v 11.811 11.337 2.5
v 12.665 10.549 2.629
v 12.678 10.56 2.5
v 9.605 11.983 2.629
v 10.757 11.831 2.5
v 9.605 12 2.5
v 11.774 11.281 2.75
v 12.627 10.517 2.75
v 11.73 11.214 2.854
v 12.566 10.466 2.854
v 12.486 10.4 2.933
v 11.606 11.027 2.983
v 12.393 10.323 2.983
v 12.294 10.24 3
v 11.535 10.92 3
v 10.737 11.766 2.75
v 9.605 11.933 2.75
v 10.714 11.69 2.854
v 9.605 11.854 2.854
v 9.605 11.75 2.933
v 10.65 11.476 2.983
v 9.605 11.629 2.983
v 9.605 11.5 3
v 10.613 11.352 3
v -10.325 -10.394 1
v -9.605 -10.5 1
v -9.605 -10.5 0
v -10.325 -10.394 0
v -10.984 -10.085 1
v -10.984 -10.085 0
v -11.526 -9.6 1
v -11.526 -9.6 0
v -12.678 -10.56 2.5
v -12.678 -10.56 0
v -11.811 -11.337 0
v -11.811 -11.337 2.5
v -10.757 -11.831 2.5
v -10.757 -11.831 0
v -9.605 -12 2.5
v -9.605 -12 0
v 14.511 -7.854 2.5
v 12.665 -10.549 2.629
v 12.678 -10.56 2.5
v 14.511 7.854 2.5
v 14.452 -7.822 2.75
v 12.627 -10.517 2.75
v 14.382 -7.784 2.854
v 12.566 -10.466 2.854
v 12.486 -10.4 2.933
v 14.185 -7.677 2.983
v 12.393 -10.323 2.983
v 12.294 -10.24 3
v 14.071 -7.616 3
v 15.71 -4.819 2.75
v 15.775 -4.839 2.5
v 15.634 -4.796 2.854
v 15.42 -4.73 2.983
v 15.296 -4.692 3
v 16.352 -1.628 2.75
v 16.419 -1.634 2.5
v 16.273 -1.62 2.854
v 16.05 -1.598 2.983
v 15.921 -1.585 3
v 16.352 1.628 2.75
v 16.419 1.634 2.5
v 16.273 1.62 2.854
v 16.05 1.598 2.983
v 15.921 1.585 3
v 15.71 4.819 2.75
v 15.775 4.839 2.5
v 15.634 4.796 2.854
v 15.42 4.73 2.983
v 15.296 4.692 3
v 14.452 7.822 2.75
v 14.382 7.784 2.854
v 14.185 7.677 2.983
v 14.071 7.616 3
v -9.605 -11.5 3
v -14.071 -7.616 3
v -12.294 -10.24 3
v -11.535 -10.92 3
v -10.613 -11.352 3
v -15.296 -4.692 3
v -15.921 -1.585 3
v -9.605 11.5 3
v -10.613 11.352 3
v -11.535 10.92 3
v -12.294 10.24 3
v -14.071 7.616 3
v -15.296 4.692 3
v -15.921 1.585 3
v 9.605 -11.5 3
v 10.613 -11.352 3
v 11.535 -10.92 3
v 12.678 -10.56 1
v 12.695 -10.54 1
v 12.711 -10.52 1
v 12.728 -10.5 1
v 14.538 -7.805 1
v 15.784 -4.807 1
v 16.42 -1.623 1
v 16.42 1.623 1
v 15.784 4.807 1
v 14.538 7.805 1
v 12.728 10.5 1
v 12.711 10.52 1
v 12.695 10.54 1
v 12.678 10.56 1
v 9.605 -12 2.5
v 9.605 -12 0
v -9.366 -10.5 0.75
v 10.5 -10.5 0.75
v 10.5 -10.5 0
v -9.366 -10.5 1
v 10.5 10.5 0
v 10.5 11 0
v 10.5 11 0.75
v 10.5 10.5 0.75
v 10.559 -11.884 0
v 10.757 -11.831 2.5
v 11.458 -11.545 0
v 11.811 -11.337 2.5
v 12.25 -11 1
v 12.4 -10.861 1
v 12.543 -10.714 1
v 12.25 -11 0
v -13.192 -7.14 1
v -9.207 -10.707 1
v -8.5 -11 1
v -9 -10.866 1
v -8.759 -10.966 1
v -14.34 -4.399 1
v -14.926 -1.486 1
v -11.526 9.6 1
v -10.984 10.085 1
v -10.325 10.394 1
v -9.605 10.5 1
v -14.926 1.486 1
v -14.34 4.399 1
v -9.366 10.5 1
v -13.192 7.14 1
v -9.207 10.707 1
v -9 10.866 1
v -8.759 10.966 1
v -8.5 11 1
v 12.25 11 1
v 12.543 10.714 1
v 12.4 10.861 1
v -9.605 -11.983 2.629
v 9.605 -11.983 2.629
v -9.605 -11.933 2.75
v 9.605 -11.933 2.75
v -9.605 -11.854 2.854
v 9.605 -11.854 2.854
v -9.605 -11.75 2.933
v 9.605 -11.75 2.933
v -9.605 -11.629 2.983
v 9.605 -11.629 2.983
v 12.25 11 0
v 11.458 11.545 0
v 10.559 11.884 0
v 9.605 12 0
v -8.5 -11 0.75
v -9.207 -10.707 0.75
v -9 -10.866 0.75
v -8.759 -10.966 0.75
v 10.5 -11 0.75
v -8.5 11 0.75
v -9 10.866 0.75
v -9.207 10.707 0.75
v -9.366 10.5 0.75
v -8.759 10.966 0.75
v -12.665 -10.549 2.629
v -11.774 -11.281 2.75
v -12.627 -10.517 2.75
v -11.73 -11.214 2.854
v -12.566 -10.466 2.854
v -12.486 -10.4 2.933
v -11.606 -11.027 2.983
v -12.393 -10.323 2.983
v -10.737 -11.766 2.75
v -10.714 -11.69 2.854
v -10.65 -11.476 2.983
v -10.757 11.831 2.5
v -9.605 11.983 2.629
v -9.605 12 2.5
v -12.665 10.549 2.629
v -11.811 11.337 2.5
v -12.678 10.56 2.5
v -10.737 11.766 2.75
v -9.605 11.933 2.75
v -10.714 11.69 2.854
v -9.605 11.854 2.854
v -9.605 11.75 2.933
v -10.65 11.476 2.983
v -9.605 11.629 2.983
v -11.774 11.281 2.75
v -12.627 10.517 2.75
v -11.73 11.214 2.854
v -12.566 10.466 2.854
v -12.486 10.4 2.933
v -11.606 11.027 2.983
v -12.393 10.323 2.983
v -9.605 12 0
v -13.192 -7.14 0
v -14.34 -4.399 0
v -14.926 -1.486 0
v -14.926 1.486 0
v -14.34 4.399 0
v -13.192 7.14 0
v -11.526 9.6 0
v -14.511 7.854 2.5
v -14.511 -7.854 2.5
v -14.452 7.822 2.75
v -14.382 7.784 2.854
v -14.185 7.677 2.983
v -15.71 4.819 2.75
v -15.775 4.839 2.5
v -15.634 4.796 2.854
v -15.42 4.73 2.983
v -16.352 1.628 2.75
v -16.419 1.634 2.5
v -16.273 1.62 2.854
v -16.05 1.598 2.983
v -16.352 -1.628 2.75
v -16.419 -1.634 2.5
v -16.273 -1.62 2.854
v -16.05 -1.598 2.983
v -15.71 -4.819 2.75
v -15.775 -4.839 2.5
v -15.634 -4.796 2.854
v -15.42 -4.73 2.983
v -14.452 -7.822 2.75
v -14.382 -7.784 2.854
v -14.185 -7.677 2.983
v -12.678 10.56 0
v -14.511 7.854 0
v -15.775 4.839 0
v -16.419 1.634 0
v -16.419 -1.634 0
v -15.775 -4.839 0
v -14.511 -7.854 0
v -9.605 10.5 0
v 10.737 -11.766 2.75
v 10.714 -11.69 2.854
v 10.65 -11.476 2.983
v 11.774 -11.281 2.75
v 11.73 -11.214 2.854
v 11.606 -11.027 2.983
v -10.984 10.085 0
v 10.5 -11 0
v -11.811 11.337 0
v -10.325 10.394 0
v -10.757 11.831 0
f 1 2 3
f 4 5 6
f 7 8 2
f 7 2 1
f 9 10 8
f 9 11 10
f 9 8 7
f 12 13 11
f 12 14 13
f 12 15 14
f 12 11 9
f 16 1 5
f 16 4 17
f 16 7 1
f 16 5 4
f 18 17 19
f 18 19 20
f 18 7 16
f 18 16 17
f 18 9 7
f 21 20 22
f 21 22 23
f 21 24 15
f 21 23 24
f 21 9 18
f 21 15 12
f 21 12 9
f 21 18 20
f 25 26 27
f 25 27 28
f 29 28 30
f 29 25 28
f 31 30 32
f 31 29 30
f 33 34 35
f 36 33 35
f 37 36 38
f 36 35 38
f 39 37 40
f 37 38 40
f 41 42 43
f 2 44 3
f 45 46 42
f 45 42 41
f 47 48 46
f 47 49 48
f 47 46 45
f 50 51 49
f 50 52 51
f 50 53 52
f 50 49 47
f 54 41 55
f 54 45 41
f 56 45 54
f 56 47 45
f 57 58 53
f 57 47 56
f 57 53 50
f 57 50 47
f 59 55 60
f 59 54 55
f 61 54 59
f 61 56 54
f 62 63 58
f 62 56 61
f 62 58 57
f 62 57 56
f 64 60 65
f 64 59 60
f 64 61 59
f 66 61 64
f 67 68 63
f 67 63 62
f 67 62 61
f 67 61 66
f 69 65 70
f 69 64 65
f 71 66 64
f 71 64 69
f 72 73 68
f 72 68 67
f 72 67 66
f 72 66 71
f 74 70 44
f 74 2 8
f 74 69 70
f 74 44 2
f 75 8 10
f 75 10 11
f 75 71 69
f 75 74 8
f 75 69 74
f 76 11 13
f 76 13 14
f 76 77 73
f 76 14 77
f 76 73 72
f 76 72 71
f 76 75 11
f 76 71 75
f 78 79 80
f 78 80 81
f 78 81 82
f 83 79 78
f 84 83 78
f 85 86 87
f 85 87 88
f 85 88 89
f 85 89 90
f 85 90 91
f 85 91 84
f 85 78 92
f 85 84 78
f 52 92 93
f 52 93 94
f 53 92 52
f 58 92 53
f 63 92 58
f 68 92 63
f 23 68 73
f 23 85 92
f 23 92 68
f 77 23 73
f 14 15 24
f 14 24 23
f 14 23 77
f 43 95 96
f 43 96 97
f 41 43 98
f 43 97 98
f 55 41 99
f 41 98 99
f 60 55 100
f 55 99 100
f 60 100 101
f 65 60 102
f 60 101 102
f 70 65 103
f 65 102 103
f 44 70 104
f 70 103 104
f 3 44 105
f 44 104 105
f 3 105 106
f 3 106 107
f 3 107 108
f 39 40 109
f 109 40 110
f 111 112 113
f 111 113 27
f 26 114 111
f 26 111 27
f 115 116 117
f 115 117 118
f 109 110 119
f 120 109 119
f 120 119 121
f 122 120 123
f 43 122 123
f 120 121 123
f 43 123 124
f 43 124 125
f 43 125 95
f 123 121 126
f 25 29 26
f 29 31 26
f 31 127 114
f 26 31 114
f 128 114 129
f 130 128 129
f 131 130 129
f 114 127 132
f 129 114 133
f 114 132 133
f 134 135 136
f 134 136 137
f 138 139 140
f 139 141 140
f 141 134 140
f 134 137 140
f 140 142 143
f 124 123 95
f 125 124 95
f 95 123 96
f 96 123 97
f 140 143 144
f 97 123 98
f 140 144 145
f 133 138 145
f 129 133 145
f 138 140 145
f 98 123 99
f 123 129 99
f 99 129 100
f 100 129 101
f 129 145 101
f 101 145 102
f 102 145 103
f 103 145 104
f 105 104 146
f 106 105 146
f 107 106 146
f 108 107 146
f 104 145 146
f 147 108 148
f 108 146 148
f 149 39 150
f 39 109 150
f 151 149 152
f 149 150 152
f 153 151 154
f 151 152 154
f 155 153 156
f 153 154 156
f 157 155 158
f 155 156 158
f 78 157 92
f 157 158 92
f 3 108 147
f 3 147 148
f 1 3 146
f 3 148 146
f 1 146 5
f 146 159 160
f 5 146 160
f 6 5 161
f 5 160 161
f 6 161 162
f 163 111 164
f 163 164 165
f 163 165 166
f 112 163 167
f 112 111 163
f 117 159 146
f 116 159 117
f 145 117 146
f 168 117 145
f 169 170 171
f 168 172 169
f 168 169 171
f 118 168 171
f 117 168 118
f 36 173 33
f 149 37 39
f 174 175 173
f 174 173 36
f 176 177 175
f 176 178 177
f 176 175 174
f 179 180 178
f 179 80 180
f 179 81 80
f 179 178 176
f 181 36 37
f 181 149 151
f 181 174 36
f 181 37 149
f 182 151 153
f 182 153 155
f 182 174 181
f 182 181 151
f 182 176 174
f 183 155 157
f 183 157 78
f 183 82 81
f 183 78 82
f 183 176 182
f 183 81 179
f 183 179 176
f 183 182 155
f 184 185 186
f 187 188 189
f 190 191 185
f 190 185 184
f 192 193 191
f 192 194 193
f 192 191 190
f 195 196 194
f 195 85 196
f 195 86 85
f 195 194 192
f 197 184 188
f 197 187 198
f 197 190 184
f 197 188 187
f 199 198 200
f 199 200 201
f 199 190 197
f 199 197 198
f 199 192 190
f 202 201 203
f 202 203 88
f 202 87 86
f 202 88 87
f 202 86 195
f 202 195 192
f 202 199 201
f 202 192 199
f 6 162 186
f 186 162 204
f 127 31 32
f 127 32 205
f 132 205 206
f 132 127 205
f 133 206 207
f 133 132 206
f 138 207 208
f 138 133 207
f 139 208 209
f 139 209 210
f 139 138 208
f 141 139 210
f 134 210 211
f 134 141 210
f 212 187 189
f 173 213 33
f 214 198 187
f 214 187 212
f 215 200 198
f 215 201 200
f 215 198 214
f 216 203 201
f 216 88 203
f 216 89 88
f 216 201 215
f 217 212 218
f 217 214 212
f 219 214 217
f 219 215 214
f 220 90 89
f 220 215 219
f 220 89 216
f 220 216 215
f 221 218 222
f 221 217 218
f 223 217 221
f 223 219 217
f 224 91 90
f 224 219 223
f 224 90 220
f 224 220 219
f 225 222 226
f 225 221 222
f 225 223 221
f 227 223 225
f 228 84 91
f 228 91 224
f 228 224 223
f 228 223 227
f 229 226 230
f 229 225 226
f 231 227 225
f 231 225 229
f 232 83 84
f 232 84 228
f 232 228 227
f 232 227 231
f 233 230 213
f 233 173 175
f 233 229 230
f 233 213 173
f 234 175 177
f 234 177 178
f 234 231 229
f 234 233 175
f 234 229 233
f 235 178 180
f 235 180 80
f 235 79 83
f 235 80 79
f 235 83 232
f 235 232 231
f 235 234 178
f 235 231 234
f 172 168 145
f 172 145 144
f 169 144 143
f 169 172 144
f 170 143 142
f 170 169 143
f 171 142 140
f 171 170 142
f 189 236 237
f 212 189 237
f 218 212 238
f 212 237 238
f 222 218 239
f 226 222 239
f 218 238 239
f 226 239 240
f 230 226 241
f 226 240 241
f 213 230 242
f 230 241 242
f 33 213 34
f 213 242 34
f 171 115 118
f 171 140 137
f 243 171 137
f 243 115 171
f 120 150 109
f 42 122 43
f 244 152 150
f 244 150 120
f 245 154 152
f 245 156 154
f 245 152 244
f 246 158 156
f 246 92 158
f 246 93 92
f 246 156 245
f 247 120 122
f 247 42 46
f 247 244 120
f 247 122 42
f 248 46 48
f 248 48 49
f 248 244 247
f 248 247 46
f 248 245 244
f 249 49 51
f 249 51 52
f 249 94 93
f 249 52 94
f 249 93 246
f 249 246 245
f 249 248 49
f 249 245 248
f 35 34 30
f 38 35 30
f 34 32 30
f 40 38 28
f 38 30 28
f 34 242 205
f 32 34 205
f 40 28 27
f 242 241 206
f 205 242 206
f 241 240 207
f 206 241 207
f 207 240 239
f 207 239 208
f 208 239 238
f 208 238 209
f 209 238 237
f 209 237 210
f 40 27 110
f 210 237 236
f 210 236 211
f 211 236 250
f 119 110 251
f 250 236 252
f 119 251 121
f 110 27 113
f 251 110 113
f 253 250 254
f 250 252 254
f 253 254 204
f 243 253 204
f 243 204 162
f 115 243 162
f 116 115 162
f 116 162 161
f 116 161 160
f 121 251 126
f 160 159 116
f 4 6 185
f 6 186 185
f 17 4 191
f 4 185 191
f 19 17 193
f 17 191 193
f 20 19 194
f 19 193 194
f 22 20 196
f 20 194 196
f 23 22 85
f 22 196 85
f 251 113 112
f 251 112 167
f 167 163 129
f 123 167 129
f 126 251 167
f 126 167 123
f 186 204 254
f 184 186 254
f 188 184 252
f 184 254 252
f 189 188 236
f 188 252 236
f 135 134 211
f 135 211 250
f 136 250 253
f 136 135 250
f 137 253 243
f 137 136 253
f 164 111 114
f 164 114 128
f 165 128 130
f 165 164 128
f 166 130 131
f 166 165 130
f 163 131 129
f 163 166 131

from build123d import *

# Parameters (mm, degrees)
EXTRUDE1_DEPTH     = 3
FILLET2_R          = 0.5
CAVITY1_DEPTH      = 1
CAVITY1_START      = 0.75
CAVITY1_2_DEPTH    = 0.25
CUT_EXTRUDE1_START = -1
CUT_EXTRUDE1_DEPTH = 1


# Read off the part's stored shape, not the designer's step: Cavity1
with BuildPart() as part:
    # Sketch1 → Extrude1 (new body)
    with BuildSketch(Plane.XY):
        with BuildLine():
            Line((-9.604686356, -12), (9.604686356, -12))
            ThreePointArc((9.604686356, -12), (11.301742631, -11.622154055), (12.67818599, -10.56))
            ThreePointArc((12.67818599, -10.56), (16.5, 0), (12.67818599, 10.56))
            ThreePointArc((12.67818599, 10.56), (11.301742631, 11.622154055), (9.604686356, 12))
            Line((9.604686356, 12), (-9.604686356, 12))
            ThreePointArc((-9.604686356, 12), (-11.301742631, 11.622154055), (-12.67818599, 10.56))
            ThreePointArc((-12.67818599, 10.56), (-16.5, 0), (-12.67818599, -10.56))
            ThreePointArc((-12.67818599, -10.56), (-11.301742631, -11.622154055), (-9.604686356, -12))
        make_face()
    extrude(amount=EXTRUDE1_DEPTH)

    # Fillet2
    fillet2_edges = [part.edges().sort_by_distance(p)[0] for p in [
        (11.301742631, -11.622154055, 3),
        (16.5, 0, 3),
        (11.301742631, 11.622154055, 3),
        (0, 12, 3),
        (-11.301742631, 11.622154055, 3),
        (-16.5, 0, 3),
        (-11.301742631, -11.622154055, 3),
        (0, -12, 3),
    ]]
    fillet(fillet2_edges, radius=FILLET2_R)

    # Cavity1 outline → Cavity1 (cut)
    with BuildSketch(Plane.XY):
        with BuildLine():
            ThreePointArc((-9.366025404, 10.5), (-9.465925826, 10.258819045), (-9.5, 10))
            Line((-9.5, 10), (-8.996077446, 10))
            Line((-8.996077446, 10), (-8.996077446, 8.00000585))
            Line((-8.996077446, 8.00000585), (-7.996077446, 8.00000585))
            Line((-7.996077446, 8.00000585), (-7.996077446, 10))
            Line((-7.996077446, 10), (-0.5, 10))
            Line((-0.5, 10), (-0.5, 7.000002926))
            Line((-0.5, 7.000002926), (0.5, 7.000002926))
            Line((0.5, 7.000002926), (0.5, 10))
            Line((0.5, 10), (7.996077446, 10))
            Line((7.996077446, 10), (7.996077446, 8.00000585))
            Line((7.996077446, 8.00000585), (8.996077446, 8.00000585))
            Line((8.996077446, 8.00000585), (8.996077446, 10))
            Line((8.996077446, 10), (10.062305899, 10))
            ThreePointArc((10.062305899, 10), (10.470554189, 9.912870929), (10.807661891, 9.666666667))
            ThreePointArc((10.807661891, 9.666666667), (14.5, 0), (10.807661891, -9.666666667))
            ThreePointArc((10.807661891, -9.666666667), (10.470554189, -9.912870929), (10.062305899, -10))
            Line((10.062305899, -10), (-9.5, -10))
            ThreePointArc((-9.5, -10), (-9.465925826, -10.258819045), (-9.366025404, -10.5))
            Line((-9.366025404, -10.5), (10.5, -10.5))
            Line((10.5, -10.5), (10.5, -11))
            Line((10.5, -11), (12.250437667, -11))
            ThreePointArc((12.250437667, -11), (12.47276199, -10.788214869), (12.67818599, -10.56))
            ThreePointArc((12.67818599, -10.56), (16.5, 0), (12.67818599, 10.56))
            ThreePointArc((12.67818599, 10.56), (12.47276199, 10.788214869), (12.250437667, 11))
            Line((12.250437667, 11), (10.5, 11))
            Line((10.5, 11), (10.5, 10.5))
            Line((10.5, 10.5), (-9.366025404, 10.5))
        make_face()
    extrude(amount=CAVITY1_DEPTH, mode=Mode.SUBTRACT)

    # Cavity1 2 outline → Cavity1 2 (cut)
    with BuildSketch(Plane.XY.offset(CAVITY1_START)):
        with BuildLine():
            ThreePointArc((-8.5, 11), (-9, 10.866025404), (-9.366025404, 10.5))
            Line((-9.366025404, 10.5), (10.5, 10.5))
            Line((10.5, 10.5), (10.5, 11))
            Line((10.5, 11), (-8.5, 11))
        make_face()
        with BuildLine():
            Line((-8.5, -11), (10.5, -11))
            Line((10.5, -11), (10.5, -10.5))
            Line((10.5, -10.5), (-9.366025404, -10.5))
            ThreePointArc((-9.366025404, -10.5), (-9, -10.866025404), (-8.5, -11))
        make_face()
    extrude(amount=CAVITY1_2_DEPTH, mode=Mode.SUBTRACT)

    # Sketch2 → Cut-Extrude1 (cut)
    with BuildSketch(Plane(origin=(0, 0, 0), x_dir=(-1, 0, 0), z_dir=(0, 0, -1)).offset(CUT_EXTRUDE1_START)):
        with BuildLine():
            Line((9.604686356, 10.5), (-12.727922061, 10.5))
            ThreePointArc((-12.727922061, 10.5), (-16.5, 0), (-12.727922061, -10.5))
            Line((-12.727922061, -10.5), (9.604686356, -10.5))
            ThreePointArc((9.604686356, -10.5), (10.665346528, -10.263846285), (11.525623627, -9.6))
            ThreePointArc((11.525623627, -9.6), (15, 0), (11.525623627, 9.6))
            ThreePointArc((11.525623627, 9.6), (10.665346528, 10.263846285), (9.604686356, 10.5))
        make_face()
    extrude(amount=CUT_EXTRUDE1_DEPTH, mode=Mode.SUBTRACT)


solid = part.part
